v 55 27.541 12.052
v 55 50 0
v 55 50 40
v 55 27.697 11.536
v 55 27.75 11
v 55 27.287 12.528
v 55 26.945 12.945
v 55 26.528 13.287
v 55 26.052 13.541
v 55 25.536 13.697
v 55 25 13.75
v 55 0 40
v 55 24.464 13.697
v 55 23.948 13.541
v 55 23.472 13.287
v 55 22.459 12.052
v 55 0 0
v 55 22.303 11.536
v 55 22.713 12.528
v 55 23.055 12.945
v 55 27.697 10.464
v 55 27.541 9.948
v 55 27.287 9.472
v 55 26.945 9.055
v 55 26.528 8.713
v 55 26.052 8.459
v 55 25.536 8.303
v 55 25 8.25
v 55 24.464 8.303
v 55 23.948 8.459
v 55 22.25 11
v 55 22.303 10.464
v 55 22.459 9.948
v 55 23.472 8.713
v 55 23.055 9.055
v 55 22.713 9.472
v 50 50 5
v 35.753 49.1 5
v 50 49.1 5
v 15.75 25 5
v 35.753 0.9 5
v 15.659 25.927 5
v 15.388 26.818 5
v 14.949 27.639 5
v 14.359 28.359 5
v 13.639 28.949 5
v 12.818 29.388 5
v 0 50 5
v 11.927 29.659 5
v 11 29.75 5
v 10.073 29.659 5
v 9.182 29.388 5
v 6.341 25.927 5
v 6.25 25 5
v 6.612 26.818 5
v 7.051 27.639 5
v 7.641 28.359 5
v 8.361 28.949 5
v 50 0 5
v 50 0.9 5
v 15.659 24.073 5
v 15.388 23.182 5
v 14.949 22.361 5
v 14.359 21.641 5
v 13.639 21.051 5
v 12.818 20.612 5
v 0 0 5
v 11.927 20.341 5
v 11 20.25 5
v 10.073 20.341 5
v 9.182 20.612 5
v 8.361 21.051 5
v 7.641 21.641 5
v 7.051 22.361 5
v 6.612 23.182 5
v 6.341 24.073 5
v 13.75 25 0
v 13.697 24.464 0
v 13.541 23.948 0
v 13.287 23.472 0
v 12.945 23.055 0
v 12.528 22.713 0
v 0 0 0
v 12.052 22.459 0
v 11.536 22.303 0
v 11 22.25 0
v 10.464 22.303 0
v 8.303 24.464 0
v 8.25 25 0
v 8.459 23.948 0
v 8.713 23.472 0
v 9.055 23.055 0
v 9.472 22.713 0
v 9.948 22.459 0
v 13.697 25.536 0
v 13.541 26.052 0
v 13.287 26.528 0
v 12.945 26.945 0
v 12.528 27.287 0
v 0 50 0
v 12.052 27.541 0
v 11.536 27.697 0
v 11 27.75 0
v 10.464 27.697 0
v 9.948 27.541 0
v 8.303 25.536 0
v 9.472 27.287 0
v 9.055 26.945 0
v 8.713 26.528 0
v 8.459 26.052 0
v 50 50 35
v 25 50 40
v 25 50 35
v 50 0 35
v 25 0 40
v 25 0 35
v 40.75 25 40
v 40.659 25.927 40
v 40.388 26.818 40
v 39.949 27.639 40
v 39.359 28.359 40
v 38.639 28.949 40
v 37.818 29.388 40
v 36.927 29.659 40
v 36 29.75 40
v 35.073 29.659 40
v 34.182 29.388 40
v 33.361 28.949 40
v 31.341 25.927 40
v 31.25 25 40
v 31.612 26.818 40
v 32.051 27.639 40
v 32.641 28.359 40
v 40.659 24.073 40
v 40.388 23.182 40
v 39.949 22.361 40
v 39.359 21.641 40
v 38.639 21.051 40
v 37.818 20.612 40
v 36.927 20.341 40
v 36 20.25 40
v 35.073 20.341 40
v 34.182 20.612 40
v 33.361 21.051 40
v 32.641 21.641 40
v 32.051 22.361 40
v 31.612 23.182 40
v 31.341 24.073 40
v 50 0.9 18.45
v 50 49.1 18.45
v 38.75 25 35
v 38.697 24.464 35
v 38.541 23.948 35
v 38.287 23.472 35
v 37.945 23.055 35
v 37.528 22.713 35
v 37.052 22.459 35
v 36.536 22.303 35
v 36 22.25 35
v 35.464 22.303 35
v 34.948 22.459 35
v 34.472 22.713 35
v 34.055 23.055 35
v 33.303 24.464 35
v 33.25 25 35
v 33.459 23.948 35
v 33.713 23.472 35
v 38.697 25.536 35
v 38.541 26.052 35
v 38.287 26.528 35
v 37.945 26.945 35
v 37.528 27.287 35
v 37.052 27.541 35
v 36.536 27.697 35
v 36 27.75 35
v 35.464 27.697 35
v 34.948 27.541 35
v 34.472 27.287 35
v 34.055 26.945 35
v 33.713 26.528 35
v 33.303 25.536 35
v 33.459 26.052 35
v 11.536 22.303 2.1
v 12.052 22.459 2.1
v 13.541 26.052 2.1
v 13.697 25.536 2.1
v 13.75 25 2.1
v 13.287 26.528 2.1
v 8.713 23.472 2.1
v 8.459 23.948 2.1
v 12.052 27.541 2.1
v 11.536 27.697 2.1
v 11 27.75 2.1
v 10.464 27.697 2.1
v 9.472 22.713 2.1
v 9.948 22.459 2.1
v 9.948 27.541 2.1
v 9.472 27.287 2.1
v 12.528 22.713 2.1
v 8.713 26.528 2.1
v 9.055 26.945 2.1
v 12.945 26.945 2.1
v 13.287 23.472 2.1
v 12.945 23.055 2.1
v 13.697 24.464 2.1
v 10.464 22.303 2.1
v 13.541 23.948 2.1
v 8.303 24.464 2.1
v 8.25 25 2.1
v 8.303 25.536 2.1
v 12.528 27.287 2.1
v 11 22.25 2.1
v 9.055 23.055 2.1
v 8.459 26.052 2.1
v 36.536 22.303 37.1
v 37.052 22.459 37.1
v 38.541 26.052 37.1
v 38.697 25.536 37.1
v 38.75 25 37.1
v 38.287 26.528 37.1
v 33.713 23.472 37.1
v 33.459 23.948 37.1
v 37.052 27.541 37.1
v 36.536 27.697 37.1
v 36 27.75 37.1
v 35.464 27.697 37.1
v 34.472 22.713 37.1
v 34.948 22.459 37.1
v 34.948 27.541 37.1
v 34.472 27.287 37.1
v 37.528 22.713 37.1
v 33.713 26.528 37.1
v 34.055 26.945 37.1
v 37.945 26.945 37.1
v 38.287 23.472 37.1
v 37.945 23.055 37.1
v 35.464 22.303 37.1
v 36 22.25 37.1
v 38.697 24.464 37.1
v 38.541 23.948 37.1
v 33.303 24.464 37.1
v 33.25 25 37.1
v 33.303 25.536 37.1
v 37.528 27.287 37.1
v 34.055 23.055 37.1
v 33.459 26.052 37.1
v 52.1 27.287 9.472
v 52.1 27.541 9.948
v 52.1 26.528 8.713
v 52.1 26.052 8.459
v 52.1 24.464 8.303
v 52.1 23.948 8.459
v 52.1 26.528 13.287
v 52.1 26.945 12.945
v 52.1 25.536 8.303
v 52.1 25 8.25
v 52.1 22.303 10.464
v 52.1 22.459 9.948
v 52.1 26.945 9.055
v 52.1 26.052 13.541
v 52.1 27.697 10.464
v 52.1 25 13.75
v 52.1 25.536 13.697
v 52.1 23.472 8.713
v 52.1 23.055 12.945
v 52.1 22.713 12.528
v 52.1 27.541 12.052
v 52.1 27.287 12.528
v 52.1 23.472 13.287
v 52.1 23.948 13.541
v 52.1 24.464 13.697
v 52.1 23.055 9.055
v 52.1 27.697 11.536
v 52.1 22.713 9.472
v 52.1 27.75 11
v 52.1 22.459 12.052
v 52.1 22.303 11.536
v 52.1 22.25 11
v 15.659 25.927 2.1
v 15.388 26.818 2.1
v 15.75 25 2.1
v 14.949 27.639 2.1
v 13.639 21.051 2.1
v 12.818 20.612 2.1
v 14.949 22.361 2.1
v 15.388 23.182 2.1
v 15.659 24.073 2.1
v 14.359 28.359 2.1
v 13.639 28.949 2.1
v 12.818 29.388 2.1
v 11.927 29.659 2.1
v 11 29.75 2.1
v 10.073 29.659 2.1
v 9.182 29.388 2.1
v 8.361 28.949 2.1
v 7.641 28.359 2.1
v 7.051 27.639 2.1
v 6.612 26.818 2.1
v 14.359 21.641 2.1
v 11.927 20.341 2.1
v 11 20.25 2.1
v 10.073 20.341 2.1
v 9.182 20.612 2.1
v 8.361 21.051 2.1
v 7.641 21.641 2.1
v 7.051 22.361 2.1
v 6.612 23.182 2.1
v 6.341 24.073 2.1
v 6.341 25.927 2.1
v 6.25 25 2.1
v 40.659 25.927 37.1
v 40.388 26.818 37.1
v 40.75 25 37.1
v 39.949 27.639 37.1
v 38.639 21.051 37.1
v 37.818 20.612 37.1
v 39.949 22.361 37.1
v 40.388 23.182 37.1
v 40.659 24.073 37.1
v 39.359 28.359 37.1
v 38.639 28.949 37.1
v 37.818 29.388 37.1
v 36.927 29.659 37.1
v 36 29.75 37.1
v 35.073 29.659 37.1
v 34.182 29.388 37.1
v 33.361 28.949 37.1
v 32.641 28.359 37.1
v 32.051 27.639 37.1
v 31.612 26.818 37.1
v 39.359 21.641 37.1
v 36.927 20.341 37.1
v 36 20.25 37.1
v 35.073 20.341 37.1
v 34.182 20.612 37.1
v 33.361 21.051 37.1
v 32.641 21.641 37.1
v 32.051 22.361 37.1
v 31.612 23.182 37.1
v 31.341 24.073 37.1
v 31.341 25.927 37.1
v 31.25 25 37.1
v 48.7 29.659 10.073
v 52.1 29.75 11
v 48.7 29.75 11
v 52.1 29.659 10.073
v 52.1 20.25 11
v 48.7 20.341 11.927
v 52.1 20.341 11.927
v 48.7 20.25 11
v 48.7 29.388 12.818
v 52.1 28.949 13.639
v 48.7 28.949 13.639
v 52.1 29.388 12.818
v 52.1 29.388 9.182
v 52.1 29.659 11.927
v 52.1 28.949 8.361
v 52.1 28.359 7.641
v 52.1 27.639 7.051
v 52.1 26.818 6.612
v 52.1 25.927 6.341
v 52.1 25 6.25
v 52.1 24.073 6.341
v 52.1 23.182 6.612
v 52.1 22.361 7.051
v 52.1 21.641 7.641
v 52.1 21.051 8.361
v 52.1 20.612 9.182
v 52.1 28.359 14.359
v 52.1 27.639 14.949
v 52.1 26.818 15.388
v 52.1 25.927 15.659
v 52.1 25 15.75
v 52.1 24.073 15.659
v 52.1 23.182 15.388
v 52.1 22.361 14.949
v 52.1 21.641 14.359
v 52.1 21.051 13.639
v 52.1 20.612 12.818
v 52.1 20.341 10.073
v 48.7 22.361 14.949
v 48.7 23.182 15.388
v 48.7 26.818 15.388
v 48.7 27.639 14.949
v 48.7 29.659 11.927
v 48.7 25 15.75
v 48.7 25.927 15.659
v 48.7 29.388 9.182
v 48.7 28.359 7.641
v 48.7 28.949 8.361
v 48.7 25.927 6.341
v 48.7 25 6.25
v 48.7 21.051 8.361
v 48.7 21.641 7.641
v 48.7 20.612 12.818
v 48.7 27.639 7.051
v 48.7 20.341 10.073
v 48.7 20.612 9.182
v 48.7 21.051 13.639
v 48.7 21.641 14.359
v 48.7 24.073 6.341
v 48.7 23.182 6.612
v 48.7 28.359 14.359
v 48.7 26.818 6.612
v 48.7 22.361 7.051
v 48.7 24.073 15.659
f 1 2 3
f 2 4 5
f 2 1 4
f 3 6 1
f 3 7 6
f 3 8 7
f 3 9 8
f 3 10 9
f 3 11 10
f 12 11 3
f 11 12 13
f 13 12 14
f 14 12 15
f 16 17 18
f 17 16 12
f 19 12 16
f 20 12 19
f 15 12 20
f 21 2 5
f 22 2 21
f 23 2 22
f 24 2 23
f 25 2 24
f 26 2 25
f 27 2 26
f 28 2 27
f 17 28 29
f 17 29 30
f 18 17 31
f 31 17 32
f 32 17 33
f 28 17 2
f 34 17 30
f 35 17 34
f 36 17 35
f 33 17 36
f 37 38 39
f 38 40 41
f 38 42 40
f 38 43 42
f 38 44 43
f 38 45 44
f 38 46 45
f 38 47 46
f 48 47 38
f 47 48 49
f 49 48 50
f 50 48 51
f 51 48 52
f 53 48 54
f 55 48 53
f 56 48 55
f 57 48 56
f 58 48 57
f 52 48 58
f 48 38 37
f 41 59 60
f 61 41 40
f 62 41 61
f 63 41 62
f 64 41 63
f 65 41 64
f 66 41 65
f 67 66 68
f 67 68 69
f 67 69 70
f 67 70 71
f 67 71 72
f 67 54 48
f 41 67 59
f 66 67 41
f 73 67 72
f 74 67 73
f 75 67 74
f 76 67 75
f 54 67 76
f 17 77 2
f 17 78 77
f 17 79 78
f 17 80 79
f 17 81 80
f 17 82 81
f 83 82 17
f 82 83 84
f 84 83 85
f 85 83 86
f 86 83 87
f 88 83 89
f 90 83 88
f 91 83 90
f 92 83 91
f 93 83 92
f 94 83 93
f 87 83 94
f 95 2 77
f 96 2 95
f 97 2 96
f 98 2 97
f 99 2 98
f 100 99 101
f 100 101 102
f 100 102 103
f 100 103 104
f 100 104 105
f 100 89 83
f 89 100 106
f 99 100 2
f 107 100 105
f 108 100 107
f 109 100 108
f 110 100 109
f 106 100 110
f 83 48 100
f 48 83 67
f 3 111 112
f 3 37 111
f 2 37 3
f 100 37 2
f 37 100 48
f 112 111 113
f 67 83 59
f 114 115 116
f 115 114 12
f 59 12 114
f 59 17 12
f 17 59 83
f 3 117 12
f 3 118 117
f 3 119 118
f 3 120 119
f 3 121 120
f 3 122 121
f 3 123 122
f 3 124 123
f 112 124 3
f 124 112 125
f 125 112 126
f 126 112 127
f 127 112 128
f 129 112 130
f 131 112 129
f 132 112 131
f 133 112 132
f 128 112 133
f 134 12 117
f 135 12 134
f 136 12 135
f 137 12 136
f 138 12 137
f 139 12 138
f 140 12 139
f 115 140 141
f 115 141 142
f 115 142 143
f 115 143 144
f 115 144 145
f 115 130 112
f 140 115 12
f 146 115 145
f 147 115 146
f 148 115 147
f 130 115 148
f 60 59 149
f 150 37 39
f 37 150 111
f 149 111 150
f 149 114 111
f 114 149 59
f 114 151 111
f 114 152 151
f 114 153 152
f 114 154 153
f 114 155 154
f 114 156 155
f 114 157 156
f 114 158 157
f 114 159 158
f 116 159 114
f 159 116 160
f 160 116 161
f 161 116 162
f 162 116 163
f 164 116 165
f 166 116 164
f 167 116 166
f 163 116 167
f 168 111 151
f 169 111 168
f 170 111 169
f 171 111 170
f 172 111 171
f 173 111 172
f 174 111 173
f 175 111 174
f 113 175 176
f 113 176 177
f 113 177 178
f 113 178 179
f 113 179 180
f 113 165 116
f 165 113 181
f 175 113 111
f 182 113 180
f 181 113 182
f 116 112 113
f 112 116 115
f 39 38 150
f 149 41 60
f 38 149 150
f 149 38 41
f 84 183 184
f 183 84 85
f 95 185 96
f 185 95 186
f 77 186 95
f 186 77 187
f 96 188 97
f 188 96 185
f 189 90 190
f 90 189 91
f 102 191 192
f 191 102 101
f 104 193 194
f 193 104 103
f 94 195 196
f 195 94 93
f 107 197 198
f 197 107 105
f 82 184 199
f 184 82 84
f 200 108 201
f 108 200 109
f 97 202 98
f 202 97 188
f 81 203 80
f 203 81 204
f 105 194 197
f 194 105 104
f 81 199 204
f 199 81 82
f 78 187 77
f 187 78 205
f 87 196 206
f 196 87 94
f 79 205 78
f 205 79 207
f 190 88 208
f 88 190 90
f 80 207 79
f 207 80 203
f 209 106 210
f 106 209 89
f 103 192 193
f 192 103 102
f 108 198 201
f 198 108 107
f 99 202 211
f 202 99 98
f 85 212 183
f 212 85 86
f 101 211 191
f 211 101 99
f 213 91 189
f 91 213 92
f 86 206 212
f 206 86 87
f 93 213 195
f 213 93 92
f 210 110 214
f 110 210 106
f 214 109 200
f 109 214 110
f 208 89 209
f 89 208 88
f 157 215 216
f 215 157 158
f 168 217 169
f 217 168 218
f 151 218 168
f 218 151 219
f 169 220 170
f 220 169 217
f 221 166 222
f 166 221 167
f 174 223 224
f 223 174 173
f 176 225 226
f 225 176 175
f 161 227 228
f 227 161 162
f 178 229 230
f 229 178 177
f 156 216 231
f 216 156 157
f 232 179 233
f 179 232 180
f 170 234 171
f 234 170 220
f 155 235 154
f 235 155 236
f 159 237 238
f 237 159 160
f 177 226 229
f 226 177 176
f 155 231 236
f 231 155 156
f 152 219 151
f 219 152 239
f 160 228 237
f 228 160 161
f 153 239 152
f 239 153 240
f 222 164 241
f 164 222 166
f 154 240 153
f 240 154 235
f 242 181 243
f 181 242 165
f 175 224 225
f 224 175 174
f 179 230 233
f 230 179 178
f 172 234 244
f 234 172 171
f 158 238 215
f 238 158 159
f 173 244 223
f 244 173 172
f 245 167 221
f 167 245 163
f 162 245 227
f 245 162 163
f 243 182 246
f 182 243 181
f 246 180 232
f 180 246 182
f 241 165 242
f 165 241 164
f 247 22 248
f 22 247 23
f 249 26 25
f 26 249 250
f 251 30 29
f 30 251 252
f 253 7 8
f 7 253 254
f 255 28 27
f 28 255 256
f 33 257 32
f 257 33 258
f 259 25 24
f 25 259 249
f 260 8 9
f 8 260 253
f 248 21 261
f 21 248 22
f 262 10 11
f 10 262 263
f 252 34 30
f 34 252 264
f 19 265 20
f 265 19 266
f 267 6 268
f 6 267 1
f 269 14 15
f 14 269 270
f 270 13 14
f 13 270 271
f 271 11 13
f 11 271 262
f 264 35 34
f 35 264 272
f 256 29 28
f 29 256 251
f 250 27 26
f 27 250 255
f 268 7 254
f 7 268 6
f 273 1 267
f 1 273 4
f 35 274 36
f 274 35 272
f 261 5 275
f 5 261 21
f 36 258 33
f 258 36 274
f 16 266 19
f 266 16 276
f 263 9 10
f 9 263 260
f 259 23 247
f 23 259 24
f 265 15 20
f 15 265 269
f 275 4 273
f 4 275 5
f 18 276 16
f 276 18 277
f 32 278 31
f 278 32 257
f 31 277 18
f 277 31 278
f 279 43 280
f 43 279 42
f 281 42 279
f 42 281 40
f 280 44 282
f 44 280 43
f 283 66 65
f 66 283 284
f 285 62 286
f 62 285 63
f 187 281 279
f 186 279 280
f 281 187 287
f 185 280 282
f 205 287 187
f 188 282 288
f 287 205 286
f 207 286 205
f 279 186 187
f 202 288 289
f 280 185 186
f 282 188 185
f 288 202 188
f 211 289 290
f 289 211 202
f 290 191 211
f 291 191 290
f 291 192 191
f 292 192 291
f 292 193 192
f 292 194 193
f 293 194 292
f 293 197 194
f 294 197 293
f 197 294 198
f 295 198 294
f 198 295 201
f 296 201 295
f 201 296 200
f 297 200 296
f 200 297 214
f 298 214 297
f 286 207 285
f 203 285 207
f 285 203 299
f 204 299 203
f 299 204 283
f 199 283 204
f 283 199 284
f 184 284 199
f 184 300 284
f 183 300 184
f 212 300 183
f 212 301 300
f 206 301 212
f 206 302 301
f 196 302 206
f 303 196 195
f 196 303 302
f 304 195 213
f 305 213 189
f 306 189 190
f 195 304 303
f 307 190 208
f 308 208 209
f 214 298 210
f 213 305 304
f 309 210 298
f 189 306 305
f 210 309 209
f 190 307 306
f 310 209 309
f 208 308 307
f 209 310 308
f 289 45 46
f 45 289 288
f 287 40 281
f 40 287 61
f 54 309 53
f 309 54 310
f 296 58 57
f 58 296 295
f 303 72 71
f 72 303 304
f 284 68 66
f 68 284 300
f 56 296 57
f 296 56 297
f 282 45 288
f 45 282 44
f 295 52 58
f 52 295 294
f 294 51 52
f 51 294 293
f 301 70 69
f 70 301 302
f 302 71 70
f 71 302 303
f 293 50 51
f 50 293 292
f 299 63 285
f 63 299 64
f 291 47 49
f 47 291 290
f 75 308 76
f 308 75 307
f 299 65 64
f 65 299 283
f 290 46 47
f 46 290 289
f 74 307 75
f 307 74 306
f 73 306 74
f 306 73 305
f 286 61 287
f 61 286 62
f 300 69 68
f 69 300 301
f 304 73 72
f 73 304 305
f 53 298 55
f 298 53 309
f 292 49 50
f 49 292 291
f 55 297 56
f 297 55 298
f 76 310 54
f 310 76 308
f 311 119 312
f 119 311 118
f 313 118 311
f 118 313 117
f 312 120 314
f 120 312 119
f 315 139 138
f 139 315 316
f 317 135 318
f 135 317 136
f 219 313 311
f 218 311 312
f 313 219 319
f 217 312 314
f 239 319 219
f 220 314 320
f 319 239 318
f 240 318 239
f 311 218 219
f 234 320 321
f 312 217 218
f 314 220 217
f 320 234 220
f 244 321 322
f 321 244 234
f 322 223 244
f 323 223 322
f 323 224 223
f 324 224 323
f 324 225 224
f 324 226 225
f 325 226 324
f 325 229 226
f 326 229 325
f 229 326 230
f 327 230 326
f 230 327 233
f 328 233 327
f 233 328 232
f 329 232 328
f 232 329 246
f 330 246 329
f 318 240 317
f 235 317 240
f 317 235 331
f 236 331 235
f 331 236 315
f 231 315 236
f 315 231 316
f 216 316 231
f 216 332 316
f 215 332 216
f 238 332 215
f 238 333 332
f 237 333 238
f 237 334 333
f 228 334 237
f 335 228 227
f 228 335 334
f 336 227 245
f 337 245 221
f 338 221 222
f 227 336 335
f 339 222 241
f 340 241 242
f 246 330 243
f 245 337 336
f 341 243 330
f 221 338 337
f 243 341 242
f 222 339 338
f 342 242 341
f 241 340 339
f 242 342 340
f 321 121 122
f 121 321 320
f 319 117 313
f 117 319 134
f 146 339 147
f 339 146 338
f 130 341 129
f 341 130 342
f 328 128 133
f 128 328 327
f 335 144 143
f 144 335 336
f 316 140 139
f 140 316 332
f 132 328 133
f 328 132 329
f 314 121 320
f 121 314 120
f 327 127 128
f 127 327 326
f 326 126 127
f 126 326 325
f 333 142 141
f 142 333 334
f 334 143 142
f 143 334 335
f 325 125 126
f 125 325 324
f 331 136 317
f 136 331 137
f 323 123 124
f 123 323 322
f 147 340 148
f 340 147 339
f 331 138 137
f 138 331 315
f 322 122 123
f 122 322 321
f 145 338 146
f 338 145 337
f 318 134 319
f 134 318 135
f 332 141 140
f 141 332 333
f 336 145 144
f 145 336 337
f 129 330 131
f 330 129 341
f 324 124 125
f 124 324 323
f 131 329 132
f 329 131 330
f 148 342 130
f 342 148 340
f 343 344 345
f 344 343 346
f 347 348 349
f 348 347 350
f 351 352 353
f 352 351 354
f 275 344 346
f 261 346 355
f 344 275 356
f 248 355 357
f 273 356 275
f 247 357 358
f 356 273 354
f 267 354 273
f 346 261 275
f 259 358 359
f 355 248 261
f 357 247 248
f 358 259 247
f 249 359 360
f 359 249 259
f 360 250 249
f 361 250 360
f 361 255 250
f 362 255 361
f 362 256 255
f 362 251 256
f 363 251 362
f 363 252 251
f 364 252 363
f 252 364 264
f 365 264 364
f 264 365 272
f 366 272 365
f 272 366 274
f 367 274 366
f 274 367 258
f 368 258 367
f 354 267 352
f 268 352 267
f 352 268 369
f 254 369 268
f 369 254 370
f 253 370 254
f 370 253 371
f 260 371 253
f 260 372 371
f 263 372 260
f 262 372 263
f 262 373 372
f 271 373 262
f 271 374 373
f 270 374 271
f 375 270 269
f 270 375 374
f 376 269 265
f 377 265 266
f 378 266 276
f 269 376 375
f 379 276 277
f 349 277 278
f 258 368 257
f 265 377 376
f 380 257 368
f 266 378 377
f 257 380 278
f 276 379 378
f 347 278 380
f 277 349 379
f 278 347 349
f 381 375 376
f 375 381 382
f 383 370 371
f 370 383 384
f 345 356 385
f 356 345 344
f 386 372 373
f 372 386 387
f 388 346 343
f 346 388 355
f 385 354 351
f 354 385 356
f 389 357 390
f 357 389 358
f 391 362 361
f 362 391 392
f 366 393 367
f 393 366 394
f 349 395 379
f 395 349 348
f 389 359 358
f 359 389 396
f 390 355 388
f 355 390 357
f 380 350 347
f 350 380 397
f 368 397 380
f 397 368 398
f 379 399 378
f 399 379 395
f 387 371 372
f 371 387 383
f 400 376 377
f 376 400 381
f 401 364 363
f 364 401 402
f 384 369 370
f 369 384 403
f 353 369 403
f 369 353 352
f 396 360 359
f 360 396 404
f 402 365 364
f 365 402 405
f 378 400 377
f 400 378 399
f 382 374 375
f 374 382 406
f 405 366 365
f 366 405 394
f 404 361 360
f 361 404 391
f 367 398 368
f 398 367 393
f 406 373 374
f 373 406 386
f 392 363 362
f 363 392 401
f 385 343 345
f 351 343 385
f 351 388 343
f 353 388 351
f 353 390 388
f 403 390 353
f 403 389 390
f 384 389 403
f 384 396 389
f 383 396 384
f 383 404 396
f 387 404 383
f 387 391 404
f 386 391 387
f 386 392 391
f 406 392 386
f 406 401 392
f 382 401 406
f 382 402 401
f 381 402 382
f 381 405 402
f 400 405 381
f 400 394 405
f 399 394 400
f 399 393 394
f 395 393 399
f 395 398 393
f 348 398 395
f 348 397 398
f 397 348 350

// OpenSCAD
$fn = 32;

// ----------------------------------------------------------------------
// Z-bracket: 55 x 50 x 40 mm
// ----------------------------------------------------------------------

// --- parameters (mm) ---
bottom_run = 55;          // lower foot length, X
top_run = 25;             // upper foot length, X
profile_w = 50;           // bracket width, Y
height = 40;              // overall rise, Z
mat_t = 5;                // plate thickness
hole_d = 5.5;             // clearance for M5
cb_d = 9.5;               // counterbore diameter
cb_h = 2.9;               // counterbore depth
rib_len = 15.2;           // gusset leg
rib_sink = 0.9;           // gusset overlap into the plates

module hole_z(px, py, z0) {
  translate([px, py, z0 - 0.5]) cylinder(h = mat_t + 1, d = hole_d);
}
module hole_x(py, pz) {
  translate([-0.5, py, pz]) rotate([0, 90, 0]) cylinder(h = mat_t + 1, d = hole_d);
}
module cb_z(px, py, top_z) {
  translate([px, py, top_z - cb_h]) cylinder(h = cb_h + 0.5, d = cb_d);
}
module cb_x(py, pz) {
  translate([mat_t - cb_h, py, pz]) rotate([0, -90, 0]) cylinder(h = cb_h + 0.5, d = cb_d);
}
module gusset(x0) {
  translate([x0, profile_w - rib_sink, 0])
    rotate([90, 0, 0])
      linear_extrude(height = profile_w - 2 * rib_sink)
        polygon(points = [[rib_sink, mat_t - rib_sink],
                          [rib_sink, mat_t - rib_sink + rib_len],
                          [-rib_len, mat_t - rib_sink]]);
}

difference() {
  union() {
    cube([bottom_run, profile_w, mat_t]);
    /* web, overlapping the lower foot */
    translate([bottom_run - mat_t, 0, 0]) cube([mat_t, profile_w, height]);
    /* upper foot, sunk into the web */
    translate([bottom_run - mat_t - top_run, 0, height - mat_t]) cube([top_run + mat_t, profile_w, mat_t]);
    gusset(bottom_run - mat_t);
  }
  hole_z(11, 25, 0);
  translate([bottom_run - mat_t - 14, 0, 0]) hole_z(0, 25, height - mat_t);
  translate([bottom_run - mat_t, 0, 0]) hole_x(25, 11);
  cb_z(11, 25, mat_t);
  translate([bottom_run - mat_t - 14, 0, 0]) cb_z(0, 25, height);
  translate([bottom_run - mat_t, 0, 0]) cb_x(25, 11);
}
